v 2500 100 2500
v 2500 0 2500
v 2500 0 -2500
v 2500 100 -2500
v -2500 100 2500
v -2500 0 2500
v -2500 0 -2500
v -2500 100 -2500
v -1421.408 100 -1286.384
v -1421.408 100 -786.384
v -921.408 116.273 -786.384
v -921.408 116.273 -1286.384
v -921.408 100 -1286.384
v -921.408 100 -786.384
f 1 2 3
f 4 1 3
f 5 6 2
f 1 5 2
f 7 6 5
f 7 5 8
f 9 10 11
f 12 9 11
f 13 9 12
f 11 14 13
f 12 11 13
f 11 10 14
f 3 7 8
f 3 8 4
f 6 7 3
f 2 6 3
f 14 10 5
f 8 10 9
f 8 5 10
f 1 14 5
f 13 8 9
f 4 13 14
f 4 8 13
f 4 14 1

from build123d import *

# Parameters (mm, degrees)
SKETCH1_W           = 5000
SKETCH1_H           = 5000
BOSS_EXTRUDE1_DEPTH = 100
SKETCH2_W           = 500
SKETCH2_H           = 500
BOSS_EXTRUDE2_DEPTH = 50
CUT_EXTRUDE1_DEPTH  = 500


with BuildPart() as part:
    # Sketch1 → Boss-Extrude1 (new body)
    with BuildSketch(Plane(origin=(0, 0, 0), x_dir=(1, 0, 0), z_dir=(0, 1, 0))):
        Rectangle(SKETCH1_W, SKETCH1_H)
    extrude(amount=BOSS_EXTRUDE1_DEPTH)

    # Sketch2 → Boss-Extrude2 (add)
    with BuildSketch(Plane(origin=(0, 100, 0), x_dir=(1, 0, 0), z_dir=(0, 1, 0))):
        with Locations((-1171.407890826, 1036.383622217)):
            Rectangle(SKETCH2_W, SKETCH2_H)
    extrude(amount=BOSS_EXTRUDE2_DEPTH)

    # Sketch3 → Cut-Extrude1 (cut)
    with BuildSketch(Plane.XY.offset(-786.383622217)):
        Polygon((-1421.407890826, 100), (-921.407890826, 116.272607691), (-921.407890826, 150), (-1421.407890826, 150), align=None)
    extrude(amount=-CUT_EXTRUDE1_DEPTH, mode=Mode.SUBTRACT)


solid = part.part
